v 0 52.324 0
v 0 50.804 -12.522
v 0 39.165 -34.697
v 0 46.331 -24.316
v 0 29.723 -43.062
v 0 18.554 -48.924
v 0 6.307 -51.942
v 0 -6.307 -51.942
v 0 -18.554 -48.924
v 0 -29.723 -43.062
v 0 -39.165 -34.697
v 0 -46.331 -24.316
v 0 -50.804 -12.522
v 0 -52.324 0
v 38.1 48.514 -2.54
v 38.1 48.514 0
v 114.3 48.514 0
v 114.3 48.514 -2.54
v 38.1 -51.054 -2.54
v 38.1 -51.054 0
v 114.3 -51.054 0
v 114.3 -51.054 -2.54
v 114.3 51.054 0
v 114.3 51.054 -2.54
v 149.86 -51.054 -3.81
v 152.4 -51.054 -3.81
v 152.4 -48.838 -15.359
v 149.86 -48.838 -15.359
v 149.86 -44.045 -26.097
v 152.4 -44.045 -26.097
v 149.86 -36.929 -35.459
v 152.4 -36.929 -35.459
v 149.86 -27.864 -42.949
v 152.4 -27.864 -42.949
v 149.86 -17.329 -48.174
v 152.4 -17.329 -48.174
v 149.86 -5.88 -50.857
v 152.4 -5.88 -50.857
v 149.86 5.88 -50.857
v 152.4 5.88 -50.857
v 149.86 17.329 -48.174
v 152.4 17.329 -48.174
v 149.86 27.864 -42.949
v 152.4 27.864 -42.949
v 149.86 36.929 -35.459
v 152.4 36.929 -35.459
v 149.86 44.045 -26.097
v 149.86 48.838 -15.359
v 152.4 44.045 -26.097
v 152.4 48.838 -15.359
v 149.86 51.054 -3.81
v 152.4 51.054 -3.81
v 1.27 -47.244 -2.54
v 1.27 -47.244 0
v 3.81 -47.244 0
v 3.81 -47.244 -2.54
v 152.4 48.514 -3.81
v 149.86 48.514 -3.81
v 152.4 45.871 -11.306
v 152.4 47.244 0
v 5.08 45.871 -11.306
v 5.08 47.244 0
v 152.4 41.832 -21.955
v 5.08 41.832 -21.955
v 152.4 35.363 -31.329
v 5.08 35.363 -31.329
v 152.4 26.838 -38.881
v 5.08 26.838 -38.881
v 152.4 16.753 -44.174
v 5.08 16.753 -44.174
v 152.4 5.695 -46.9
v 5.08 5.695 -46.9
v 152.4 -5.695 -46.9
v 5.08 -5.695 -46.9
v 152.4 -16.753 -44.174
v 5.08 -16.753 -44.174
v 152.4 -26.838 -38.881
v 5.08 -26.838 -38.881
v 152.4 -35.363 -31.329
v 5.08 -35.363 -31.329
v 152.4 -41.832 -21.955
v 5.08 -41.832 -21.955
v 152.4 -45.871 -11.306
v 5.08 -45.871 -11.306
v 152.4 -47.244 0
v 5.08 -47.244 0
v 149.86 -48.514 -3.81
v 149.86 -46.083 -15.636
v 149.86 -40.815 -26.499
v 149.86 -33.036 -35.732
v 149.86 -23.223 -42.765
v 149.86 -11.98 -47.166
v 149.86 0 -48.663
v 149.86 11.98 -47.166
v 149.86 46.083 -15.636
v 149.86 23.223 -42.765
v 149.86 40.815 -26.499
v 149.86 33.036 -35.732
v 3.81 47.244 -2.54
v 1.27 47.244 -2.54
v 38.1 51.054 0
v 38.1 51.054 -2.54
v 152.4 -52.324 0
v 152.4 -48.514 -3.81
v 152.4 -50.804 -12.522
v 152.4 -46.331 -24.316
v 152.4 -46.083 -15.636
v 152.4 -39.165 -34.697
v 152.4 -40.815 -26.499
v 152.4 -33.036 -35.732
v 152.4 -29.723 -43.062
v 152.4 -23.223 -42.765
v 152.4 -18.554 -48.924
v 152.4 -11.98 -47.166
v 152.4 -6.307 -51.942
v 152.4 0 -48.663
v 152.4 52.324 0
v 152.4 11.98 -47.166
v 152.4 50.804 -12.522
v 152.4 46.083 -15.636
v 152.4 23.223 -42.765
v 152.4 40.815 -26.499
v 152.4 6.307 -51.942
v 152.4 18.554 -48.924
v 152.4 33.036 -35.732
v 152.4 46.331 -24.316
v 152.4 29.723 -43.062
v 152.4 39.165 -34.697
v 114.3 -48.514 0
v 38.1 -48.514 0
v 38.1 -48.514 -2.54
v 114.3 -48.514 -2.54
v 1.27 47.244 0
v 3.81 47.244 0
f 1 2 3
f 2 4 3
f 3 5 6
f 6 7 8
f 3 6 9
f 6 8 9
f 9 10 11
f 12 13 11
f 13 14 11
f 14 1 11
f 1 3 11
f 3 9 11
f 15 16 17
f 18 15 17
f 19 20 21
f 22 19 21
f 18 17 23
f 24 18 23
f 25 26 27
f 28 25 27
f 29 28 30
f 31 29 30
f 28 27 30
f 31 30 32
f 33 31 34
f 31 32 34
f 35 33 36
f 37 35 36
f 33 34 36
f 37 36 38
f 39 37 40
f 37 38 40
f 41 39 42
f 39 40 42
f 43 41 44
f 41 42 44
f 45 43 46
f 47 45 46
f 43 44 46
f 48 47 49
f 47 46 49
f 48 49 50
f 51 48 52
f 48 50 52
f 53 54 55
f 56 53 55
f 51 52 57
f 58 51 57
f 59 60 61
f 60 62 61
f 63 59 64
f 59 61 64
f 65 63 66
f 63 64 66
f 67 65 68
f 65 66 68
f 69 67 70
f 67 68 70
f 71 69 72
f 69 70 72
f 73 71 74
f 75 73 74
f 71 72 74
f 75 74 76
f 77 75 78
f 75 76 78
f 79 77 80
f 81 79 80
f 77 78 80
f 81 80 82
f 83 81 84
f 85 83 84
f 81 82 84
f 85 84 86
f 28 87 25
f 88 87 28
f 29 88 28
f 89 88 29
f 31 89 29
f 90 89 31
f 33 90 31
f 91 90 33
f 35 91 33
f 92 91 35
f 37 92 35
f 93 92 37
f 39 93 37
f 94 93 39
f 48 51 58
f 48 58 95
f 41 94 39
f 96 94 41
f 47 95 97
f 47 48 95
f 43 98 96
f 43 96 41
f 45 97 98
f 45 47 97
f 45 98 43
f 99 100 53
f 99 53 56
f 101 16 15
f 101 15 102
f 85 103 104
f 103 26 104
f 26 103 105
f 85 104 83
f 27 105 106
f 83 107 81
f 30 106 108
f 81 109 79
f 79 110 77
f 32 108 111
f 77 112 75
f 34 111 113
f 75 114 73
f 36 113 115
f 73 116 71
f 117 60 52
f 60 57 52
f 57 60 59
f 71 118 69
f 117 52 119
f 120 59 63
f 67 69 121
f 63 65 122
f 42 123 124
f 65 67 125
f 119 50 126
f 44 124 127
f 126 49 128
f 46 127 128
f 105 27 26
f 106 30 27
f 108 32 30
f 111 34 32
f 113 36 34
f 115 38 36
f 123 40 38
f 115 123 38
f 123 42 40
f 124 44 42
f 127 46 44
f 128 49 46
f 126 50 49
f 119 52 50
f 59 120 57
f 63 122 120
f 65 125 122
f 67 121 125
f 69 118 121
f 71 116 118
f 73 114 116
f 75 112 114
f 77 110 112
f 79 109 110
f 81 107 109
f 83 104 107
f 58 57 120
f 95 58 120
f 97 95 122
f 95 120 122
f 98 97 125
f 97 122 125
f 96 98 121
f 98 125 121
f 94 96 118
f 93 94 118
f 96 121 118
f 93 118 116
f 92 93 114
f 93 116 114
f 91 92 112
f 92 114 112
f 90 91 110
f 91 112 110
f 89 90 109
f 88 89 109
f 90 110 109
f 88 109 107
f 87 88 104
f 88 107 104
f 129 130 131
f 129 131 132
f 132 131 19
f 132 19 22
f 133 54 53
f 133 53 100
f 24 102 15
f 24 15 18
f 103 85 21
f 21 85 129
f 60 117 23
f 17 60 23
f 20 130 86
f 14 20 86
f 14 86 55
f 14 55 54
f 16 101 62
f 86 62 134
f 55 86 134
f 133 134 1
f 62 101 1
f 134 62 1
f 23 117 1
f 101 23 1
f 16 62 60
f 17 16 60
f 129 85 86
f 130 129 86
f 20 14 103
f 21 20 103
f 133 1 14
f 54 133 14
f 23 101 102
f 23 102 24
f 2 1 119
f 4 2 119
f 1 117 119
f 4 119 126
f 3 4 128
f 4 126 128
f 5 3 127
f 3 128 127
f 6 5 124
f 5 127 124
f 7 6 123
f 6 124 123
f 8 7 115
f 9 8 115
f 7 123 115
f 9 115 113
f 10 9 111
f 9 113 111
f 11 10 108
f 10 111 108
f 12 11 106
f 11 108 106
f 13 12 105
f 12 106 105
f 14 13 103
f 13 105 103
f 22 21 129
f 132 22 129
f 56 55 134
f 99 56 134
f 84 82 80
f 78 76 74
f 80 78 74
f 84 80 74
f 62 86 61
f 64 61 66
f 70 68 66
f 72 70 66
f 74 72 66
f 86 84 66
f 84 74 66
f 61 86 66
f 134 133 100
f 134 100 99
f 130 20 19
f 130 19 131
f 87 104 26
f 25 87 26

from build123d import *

# Parameters (mm, degrees)
REVOLVE1_ANGLE     = 180
SKETCH4_W          = 2.54
SKETCH4_H          = 94.488
SKETCH4_W_2        = 76.2
SKETCH4_H_2        = 2.54
CUT_EXTRUDE1_DEPTH = 2.54
CUT_EXTRUDE2_DEPTH = 2.54


with BuildPart() as part:
    # Sketch1 → Revolve1 (revolve)
    with BuildSketch(Plane.XY):
        Polygon((0, 0), (0, 52.324), (152.4, 52.324), (152.4, 47.244), (5.08, 47.244), (5.08, 0), align=None)
    revolve(axis=Axis((5.08, 0, 0), (-1, 0, 0)), revolution_arc=REVOLVE1_ANGLE)

    # Sketch4 → Cut-Extrude1 (cut)
    with BuildSketch(Plane.XY):
        with Locations((2.54, 0)):
            Rectangle(SKETCH4_W, SKETCH4_H)
        with Locations((76.2, 49.784)):
            Rectangle(SKETCH4_W_2, SKETCH4_H_2)
        with Locations((76.2, -49.784)):
            Rectangle(SKETCH4_W_2, SKETCH4_H_2)
    extrude(amount=-CUT_EXTRUDE1_DEPTH, mode=Mode.SUBTRACT)

    # Sketch5 → Cut-Extrude2 (cut)
    with BuildSketch(Plane(origin=(152.4, 0, 0), x_dir=(0, 0, -1), z_dir=(1, 0, 0))):
        with BuildLine():
            Line((3.81, 51.054), (3.81, 48.514))
            ThreePointArc((3.81, 48.514), (48.663377359, 0), (3.81, -48.514))
            Line((3.81, -48.514), (3.81, -51.054))
            ThreePointArc((3.81, -51.054), (51.195966794, 0), (3.81, 51.054))
        make_face()
    extrude(amount=-CUT_EXTRUDE2_DEPTH, mode=Mode.SUBTRACT)


solid = part.part
